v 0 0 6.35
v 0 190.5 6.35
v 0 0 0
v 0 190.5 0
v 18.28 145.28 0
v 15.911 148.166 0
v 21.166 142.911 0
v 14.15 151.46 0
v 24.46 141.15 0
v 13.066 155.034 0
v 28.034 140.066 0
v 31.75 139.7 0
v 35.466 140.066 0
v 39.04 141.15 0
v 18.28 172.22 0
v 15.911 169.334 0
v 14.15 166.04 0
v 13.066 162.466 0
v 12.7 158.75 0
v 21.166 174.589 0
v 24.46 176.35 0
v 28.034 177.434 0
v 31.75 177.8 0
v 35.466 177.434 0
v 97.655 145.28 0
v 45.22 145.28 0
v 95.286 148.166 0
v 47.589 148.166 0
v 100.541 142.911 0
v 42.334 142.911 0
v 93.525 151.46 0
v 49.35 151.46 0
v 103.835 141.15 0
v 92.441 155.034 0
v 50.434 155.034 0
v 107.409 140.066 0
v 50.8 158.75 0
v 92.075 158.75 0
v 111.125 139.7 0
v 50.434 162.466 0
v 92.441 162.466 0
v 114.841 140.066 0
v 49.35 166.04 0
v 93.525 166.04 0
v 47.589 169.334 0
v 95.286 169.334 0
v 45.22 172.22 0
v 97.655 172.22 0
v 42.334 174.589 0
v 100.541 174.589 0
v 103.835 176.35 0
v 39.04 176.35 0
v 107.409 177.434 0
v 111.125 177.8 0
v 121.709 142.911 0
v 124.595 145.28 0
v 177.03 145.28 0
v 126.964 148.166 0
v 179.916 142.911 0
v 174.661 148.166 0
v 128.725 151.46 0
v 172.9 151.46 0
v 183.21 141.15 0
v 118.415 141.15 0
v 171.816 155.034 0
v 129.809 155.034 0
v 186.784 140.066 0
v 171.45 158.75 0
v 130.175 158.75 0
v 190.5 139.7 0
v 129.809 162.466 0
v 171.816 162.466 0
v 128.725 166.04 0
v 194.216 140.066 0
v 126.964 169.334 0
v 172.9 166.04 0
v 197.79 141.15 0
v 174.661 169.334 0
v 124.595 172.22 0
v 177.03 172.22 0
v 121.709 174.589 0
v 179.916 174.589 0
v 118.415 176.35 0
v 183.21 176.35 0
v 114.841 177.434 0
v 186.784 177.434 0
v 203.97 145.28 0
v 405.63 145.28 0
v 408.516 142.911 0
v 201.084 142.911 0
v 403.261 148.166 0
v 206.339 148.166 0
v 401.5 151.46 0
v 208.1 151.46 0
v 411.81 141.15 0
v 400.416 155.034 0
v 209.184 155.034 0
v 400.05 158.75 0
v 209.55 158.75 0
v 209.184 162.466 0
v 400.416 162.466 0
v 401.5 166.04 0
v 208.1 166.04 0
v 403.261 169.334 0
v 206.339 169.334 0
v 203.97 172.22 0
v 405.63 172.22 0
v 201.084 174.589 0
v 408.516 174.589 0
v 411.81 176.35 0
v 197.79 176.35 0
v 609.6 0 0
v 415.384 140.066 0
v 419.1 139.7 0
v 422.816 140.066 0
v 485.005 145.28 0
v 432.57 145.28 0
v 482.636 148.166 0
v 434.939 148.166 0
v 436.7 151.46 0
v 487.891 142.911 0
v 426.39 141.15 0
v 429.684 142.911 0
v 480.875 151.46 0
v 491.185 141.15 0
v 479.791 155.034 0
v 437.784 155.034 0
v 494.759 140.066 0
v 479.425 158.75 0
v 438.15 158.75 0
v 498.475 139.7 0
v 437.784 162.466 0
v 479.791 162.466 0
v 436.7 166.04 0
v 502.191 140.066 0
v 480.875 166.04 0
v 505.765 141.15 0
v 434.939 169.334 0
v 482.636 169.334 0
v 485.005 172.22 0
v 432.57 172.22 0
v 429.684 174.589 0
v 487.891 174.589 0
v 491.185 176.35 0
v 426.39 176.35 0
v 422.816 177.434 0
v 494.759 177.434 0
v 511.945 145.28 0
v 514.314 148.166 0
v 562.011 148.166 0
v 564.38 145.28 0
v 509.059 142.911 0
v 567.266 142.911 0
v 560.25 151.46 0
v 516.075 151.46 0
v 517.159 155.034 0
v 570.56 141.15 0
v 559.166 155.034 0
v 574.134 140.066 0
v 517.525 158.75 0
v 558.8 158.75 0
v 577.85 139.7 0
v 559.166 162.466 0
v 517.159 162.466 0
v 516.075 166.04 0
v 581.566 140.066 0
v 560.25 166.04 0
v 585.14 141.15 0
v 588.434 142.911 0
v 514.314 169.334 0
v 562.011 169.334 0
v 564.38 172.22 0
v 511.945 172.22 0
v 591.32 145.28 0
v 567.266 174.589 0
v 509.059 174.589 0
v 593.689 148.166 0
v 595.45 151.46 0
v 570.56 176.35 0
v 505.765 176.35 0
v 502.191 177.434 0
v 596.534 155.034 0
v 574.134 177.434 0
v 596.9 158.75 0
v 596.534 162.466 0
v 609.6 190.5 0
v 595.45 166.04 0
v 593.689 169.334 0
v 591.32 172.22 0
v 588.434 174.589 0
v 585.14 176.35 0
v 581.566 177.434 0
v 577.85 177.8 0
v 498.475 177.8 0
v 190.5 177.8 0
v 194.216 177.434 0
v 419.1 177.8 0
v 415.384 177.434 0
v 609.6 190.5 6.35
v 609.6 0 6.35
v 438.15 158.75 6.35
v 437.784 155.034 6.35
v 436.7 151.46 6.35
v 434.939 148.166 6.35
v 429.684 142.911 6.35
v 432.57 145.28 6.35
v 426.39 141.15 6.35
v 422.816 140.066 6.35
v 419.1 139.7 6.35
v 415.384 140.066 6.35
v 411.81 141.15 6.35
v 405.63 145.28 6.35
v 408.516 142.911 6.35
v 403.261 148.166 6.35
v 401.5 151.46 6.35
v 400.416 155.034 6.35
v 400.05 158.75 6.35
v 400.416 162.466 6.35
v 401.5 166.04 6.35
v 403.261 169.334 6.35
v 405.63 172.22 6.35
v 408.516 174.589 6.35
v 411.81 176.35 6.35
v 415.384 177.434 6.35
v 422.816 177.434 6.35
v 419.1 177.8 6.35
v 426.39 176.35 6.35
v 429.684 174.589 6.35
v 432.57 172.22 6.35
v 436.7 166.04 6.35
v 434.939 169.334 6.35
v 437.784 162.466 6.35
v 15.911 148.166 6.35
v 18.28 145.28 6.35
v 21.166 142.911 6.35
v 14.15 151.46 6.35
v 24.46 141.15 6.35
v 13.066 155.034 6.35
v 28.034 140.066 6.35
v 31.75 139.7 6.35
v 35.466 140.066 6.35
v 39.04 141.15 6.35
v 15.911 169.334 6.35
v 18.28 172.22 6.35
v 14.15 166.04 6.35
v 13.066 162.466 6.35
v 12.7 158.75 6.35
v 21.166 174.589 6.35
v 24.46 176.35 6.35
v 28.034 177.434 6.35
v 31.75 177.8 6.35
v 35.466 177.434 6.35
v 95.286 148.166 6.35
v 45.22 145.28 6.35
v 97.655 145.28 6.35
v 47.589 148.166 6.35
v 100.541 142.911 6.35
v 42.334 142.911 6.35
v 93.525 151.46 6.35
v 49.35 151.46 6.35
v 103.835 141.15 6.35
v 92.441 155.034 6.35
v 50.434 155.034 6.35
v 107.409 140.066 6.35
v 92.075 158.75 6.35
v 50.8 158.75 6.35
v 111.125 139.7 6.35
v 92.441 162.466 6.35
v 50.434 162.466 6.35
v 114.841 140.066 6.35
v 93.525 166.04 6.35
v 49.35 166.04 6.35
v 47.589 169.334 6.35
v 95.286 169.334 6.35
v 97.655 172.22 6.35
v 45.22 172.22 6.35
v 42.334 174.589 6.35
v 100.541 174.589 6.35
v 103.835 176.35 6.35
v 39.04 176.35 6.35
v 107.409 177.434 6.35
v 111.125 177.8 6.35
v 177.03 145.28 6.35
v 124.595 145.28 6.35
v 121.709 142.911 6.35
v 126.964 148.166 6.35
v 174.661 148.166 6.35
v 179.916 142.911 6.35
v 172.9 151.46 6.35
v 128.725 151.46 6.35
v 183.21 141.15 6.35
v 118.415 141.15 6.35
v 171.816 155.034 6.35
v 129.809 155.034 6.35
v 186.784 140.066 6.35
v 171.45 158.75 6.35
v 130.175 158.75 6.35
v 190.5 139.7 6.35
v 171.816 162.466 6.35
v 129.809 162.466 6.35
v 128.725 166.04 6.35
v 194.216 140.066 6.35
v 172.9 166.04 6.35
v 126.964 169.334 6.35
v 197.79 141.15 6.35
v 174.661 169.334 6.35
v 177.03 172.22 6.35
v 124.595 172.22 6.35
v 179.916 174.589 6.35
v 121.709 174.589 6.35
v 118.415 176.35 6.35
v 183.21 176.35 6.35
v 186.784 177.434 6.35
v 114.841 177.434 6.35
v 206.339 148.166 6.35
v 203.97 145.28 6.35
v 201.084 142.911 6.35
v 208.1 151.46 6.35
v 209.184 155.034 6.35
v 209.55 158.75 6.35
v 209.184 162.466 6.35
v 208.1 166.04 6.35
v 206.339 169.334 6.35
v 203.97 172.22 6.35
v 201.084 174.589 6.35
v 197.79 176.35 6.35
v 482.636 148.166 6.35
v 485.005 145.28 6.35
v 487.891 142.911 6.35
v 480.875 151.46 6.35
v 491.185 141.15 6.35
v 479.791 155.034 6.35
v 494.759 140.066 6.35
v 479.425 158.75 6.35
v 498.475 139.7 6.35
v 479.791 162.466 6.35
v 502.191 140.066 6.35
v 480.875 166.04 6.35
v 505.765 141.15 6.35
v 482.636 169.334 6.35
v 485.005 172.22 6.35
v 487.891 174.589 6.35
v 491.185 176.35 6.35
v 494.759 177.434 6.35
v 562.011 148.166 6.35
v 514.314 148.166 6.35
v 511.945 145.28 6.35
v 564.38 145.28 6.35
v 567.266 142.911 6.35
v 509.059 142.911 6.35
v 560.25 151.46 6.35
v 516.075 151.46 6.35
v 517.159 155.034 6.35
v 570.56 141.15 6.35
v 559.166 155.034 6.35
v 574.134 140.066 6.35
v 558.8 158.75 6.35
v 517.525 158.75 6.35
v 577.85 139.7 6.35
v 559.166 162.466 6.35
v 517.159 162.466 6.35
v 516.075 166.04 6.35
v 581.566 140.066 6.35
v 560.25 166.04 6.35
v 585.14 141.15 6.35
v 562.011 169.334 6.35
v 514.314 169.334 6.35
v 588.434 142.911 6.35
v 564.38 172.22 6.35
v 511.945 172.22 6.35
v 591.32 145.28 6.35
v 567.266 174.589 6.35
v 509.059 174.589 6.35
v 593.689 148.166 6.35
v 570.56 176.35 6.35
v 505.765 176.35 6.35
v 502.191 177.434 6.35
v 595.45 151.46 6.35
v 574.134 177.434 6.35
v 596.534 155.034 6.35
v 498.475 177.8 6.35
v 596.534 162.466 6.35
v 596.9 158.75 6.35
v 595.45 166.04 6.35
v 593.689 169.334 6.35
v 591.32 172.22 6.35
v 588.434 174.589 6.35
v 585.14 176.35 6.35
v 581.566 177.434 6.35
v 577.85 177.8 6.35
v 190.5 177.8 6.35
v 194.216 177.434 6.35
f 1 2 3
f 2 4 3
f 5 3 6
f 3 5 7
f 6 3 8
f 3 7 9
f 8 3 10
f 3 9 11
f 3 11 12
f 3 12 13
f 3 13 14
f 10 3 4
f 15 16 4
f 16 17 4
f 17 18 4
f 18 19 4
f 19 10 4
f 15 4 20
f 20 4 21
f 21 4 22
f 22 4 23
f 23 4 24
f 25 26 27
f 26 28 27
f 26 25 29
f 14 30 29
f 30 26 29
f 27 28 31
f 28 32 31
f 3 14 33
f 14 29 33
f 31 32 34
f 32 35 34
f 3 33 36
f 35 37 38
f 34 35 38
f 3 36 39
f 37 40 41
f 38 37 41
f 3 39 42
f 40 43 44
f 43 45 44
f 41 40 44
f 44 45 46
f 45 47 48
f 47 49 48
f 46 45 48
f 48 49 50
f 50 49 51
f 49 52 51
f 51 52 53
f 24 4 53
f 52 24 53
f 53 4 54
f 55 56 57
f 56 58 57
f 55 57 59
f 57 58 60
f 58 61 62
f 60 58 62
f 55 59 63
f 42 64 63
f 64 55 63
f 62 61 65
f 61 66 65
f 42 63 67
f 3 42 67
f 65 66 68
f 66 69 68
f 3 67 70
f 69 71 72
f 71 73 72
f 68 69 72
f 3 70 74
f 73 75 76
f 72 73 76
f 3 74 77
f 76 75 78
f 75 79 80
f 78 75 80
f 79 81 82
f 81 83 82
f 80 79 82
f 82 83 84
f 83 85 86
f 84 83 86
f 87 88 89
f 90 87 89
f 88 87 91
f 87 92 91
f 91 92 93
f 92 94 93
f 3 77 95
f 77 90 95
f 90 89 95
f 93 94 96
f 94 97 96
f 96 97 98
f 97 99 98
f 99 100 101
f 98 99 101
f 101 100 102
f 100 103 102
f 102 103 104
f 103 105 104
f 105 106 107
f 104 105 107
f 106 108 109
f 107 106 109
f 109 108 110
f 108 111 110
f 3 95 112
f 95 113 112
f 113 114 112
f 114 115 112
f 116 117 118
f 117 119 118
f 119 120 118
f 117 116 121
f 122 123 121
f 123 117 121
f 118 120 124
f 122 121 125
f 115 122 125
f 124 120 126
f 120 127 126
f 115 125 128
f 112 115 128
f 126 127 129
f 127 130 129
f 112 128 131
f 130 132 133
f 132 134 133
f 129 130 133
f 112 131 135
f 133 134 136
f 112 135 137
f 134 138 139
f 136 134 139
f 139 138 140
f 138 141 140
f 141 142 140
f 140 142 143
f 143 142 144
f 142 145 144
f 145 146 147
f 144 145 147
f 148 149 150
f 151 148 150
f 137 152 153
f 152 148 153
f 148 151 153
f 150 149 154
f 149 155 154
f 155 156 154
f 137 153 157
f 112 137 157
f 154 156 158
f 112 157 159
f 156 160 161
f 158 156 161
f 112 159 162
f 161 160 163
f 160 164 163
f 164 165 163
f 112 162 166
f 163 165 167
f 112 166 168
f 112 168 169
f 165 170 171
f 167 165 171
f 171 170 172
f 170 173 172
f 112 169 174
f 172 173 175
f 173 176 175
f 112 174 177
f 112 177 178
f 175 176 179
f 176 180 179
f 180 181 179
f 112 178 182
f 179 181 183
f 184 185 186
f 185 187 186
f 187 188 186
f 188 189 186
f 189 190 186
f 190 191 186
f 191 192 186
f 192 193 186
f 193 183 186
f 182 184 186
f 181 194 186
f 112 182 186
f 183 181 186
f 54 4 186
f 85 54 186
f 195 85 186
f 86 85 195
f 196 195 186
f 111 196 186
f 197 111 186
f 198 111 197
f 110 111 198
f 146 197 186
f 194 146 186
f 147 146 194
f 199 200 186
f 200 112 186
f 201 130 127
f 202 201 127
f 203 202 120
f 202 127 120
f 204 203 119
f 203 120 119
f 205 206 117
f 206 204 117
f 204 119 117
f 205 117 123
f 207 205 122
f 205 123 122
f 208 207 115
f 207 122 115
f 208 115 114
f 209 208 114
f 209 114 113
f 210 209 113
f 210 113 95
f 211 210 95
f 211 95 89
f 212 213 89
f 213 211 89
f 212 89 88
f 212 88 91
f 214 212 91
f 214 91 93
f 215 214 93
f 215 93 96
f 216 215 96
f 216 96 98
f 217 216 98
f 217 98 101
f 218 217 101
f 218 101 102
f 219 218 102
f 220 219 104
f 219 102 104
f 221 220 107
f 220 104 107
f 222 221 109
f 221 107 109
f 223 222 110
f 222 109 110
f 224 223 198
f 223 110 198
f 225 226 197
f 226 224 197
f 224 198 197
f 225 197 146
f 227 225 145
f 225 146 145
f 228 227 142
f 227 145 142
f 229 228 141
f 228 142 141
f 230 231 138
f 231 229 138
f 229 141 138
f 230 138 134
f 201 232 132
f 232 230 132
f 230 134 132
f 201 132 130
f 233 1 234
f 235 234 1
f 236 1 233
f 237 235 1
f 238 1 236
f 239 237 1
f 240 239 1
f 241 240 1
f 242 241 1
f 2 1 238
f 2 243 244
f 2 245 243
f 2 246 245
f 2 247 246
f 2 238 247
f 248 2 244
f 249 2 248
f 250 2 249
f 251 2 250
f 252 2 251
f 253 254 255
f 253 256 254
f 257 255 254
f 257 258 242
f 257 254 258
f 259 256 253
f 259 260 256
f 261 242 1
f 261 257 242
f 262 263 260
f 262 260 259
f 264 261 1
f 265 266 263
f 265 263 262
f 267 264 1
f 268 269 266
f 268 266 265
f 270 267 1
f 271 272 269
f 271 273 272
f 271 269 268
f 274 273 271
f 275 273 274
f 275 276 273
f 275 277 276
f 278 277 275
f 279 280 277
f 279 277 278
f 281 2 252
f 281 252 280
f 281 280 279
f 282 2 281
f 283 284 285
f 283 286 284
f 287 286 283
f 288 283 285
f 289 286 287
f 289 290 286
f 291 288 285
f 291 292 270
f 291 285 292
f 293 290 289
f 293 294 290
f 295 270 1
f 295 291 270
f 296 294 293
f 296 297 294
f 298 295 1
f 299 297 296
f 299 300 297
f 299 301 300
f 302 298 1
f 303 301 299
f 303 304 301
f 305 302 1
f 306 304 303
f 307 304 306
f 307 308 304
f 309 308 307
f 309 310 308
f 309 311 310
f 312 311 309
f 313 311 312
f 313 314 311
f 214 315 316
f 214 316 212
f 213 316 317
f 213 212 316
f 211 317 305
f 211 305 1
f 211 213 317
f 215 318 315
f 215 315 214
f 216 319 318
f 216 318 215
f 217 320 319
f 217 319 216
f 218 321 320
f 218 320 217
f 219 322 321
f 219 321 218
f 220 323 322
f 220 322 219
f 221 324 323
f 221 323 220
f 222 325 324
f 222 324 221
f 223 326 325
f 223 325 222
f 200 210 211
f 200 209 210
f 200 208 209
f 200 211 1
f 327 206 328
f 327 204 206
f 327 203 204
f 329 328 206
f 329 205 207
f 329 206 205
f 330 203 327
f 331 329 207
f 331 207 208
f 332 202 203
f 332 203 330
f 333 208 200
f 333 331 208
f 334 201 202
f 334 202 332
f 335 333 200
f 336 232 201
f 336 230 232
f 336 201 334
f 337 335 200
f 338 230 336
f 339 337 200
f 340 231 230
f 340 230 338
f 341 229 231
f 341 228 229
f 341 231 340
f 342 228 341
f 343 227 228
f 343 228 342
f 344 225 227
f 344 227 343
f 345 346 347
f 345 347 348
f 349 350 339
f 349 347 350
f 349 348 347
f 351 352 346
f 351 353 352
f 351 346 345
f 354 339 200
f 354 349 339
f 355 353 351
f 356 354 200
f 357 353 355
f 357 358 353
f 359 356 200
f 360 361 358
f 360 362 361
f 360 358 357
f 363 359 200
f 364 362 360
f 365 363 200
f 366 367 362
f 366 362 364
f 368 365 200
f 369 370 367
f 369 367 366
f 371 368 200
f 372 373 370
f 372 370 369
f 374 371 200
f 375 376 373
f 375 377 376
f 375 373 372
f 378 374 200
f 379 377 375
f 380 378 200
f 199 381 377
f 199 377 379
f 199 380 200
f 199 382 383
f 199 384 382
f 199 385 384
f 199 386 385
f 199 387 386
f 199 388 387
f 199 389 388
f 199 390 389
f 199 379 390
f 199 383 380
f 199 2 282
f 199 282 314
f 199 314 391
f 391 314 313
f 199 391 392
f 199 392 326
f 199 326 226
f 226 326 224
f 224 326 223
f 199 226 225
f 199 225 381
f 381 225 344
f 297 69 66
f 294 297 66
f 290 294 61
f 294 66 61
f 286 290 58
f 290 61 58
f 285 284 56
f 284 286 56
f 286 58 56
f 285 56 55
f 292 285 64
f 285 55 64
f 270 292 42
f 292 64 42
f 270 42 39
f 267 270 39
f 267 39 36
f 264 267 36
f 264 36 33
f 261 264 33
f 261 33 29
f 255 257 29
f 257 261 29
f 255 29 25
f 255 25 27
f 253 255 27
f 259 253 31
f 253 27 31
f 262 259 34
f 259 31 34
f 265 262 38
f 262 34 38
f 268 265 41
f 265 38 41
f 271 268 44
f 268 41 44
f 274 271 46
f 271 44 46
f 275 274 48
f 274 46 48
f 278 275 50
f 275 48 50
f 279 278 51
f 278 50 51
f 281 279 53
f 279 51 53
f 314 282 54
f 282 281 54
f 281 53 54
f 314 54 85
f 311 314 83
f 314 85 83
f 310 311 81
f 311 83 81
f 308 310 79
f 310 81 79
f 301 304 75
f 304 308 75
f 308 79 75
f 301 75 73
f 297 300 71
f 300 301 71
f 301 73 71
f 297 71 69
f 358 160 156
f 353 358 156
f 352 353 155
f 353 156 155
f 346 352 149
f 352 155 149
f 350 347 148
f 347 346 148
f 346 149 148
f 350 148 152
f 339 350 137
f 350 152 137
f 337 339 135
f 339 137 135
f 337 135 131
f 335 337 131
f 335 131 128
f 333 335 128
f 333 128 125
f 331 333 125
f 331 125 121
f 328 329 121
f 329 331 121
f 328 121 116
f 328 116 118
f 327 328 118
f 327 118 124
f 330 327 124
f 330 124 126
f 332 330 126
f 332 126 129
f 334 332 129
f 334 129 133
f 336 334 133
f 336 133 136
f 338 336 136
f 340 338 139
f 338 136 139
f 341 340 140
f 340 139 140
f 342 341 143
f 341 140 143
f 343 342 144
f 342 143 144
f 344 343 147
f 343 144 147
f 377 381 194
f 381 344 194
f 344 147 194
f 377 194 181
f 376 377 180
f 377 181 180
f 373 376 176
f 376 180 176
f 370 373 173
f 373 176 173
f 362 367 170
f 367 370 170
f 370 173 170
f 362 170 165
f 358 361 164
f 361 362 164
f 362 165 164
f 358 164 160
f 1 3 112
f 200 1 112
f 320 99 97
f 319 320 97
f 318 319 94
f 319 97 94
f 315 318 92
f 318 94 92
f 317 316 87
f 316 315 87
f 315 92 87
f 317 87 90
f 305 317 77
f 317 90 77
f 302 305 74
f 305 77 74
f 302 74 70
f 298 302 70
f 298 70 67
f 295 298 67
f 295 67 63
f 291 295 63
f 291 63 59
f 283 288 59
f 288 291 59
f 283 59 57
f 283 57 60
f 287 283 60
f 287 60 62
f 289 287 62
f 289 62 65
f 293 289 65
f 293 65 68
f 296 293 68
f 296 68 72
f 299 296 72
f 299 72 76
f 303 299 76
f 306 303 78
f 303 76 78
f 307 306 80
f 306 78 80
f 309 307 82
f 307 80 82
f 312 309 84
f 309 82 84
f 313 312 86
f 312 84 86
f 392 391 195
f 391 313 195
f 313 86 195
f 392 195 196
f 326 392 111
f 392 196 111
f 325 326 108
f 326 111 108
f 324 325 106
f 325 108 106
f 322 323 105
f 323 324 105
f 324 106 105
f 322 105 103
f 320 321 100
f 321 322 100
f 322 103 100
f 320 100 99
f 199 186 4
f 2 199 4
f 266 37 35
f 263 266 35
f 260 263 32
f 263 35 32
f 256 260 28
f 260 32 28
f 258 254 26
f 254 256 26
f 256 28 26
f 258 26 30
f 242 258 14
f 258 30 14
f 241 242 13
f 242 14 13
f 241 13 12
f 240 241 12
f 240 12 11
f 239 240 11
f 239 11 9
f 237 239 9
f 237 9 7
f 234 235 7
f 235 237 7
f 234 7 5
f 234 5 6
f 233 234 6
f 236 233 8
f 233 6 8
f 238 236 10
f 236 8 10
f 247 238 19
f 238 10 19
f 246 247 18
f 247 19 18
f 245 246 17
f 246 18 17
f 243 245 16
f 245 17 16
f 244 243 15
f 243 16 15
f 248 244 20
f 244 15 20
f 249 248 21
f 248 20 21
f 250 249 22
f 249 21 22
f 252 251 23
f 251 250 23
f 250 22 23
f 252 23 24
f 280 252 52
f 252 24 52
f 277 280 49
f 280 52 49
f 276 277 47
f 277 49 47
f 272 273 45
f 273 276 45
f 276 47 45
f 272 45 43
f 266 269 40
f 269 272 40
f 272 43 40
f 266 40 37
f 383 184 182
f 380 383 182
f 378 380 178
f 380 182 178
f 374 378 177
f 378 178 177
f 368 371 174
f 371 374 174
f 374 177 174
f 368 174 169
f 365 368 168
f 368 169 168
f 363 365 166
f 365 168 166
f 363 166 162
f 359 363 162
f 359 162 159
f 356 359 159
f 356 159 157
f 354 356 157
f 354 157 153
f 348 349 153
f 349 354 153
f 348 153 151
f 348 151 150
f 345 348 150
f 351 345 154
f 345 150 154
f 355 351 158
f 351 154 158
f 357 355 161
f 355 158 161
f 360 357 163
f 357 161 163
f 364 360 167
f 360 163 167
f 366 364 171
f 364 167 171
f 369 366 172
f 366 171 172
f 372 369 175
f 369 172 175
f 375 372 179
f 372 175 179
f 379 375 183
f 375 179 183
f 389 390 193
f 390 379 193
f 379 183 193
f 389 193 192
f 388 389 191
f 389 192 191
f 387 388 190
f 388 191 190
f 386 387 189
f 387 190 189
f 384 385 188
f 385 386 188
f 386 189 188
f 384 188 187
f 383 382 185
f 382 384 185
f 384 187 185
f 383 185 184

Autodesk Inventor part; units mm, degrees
ref_plane "YZ Plane" through (0, 0, 0) normal (1, 0, 0) x (0, 1, 0)
ref_plane "XZ Plane" through (0, 0, 0) normal (0, 1, 0) x (-1, 0, 0)
ref_plane "XY Plane" through (0, 0, 0) normal (0, 0, 1) x (1, 0, 0)
sketch "Sketch1" plane through (0, 0, 0) normal (0, 0, 1) x (1, 0, 0)
  line L0 (0, 0) -> (609.6, 0)
  line L1 (609.6, 0) -> (609.6, 190.5)
  line L2 (609.6, 190.5) -> (0, 190.5)
  line L3 (0, 190.5) -> (0, 0)
  circle A0 centre (577.85, 158.75) radius 19.05
  circle A1 centre (419.1, 158.75) radius 19.05
  circle A2 centre (190.5, 158.75) radius 19.05
  circle A3 centre (31.75, 158.75) radius 19.05
  circle A4 centre (498.475, 158.75) radius 19.05
  circle A5 centre (111.125, 158.75) radius 19.05
  dimension "d0" = 190.5
  dimension "d1" = 609.6
  dimension "d13" = 38.1
  dimension "d14" = 38.1
  dimension "d15" = 228.6
  dimension "d16" = 158.75
  dimension "d17" = 79.375
  dimension "d18" = 79.375
  dimension "d21" = 31.75
  dimension "d22" = 31.75
  dimension "d23" = 31.75
extrude "Extrusion1" add sketch "Sketch1" along normal blind 6.35
equation "\"d14\" = d13"
equation "\"d16\" = 0.5 * d1 - 0.5 * d15 - d23"
equation "\"d17\" = 0.5 * d16"
equation "\"d18\" = d17"
equation "\"d23\" = d22"
properties part number "manipulator back pannel"
